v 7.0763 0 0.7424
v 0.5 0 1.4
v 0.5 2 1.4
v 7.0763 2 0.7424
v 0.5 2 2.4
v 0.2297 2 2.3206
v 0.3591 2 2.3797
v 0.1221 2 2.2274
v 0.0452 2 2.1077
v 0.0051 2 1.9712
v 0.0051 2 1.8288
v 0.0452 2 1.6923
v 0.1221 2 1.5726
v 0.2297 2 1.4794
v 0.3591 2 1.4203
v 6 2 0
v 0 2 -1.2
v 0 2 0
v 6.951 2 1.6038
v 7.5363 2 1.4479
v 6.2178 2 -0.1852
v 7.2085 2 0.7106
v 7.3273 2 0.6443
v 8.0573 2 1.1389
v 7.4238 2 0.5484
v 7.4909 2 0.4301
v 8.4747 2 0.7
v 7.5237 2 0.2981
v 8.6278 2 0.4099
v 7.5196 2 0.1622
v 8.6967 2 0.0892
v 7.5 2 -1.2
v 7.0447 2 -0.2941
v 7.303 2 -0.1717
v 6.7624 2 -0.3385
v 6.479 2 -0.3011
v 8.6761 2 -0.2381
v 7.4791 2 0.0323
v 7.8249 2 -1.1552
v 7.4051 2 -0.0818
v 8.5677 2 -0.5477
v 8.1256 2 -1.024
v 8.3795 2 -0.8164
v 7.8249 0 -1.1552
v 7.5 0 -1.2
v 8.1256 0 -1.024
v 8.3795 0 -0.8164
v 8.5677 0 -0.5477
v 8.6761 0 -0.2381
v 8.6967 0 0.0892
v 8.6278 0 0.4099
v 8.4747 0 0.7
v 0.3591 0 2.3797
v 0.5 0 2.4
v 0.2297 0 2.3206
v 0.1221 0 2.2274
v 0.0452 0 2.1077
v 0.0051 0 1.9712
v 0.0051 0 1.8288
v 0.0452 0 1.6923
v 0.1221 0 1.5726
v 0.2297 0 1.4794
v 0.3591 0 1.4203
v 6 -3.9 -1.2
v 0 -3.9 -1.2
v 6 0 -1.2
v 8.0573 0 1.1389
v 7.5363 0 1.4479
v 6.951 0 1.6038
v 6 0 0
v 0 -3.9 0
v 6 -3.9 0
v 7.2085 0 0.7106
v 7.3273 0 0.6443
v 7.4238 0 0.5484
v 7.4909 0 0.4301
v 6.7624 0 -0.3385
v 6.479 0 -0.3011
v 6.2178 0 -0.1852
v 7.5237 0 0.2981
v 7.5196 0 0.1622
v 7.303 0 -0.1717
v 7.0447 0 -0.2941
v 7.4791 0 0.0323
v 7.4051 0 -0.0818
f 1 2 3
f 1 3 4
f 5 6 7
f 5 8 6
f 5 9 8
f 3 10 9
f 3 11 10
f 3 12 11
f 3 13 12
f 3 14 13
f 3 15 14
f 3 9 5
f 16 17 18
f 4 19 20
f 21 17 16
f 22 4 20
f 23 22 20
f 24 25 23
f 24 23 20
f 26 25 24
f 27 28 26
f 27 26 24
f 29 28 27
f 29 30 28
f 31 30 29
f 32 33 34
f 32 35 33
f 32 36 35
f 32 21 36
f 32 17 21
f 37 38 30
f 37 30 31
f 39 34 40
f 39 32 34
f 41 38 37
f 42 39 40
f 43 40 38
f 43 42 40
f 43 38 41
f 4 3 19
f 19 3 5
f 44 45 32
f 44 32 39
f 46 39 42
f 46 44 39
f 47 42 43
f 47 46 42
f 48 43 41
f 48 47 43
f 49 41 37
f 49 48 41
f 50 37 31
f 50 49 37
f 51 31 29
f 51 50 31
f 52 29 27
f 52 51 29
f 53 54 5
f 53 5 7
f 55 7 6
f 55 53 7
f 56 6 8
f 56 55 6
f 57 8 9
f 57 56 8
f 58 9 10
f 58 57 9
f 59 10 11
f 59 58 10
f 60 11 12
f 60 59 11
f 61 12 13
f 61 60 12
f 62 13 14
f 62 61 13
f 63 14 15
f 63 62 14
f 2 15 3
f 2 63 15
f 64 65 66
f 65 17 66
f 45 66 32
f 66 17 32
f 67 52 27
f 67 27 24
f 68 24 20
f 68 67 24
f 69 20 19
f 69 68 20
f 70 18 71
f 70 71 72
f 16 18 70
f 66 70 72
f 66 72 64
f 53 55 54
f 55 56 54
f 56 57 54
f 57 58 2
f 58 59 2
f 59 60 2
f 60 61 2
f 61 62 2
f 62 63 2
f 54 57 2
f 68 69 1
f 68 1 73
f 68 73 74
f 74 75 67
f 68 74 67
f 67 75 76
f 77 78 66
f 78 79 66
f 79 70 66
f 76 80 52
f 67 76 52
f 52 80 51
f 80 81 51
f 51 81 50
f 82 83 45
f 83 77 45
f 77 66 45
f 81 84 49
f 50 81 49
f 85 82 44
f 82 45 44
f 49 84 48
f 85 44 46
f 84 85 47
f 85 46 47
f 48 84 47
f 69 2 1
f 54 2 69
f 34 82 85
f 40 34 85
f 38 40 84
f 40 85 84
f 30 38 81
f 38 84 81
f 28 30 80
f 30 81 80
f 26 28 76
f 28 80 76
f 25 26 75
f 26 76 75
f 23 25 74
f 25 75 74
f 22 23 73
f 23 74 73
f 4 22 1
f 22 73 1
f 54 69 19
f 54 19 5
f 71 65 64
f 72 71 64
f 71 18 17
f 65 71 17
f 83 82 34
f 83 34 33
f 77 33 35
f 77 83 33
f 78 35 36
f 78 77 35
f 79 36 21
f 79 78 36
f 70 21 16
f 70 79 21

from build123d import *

# Parameters (mm, degrees)
BOSS_EXTRUDE1_DEPTH = 2
SKETCH2_W           = 6
SKETCH2_H           = 1.2
BOSS_EXTRUDE2_DEPTH = 3.9
FILLET1_DEPTH       = 2


with BuildPart() as part:
    # Sketch1 → Boss-Extrude1 (new body)
    with BuildSketch(Plane(origin=(0, 0, 0), x_dir=(1, 0, 0), z_dir=(0, 1, 0))):
        with BuildLine():
            Line((0, 1.2), (7.5, 1.2))
            ThreePointArc((7.5, 1.2), (8.567707825, 0.547722558), (8.474679434, -0.7))
            ThreePointArc((8.474679434, -0.7), (7.807430734, -1.311314361), (6.951049145, -1.603780854))
            Line((6.951049145, -1.603780854), (0.5, -2.4))
            ThreePointArc((0.5, -2.4), (0, -1.9), (0.5, -1.4))
            Line((0.5, -1.4), (7.5, -0.7))
            ThreePointArc((7.5, -0.7), (7.642928579, -0.35), (7.5, 0))
            ThreePointArc((7.5, 0), (6.75, 0.338562172), (6, 0))
            Line((6, 0), (0, 0))
            Line((0, 0), (0, 1.2))
        make_face()
    extrude(amount=BOSS_EXTRUDE1_DEPTH)

    # Sketch2 → Boss-Extrude2 (add)
    with BuildSketch(Plane(origin=(0, 0, 0), x_dir=(1, 0, 0), z_dir=(0, 1, 0))):
        with Locations((3, 0.6)):
            Rectangle(SKETCH2_W, SKETCH2_H)
    extrude(amount=-BOSS_EXTRUDE2_DEPTH)

    # Fillet1: read off the stored shape, not the designer's step
    # Fillet1 outline → Fillet1 (add)
    with BuildSketch(Plane(origin=(0, 0, 0), x_dir=(1, 0, 0), z_dir=(0, 1, 0))):
        with BuildLine():
            ThreePointArc((7.5, 0), (7.407145524, 0.092325902), (7.303023614, 0.171727751))
            ThreePointArc((7.303023614, 0.171727751), (7.511802782, -0.365240542), (7.076263667, -0.742373633))
            Line((7.076263667, -0.742373633), (7.5, -0.7))
            ThreePointArc((7.5, -0.7), (7.642928579, -0.35), (7.5, 0))
        make_face()
    extrude(amount=FILLET1_DEPTH)


solid = part.part
